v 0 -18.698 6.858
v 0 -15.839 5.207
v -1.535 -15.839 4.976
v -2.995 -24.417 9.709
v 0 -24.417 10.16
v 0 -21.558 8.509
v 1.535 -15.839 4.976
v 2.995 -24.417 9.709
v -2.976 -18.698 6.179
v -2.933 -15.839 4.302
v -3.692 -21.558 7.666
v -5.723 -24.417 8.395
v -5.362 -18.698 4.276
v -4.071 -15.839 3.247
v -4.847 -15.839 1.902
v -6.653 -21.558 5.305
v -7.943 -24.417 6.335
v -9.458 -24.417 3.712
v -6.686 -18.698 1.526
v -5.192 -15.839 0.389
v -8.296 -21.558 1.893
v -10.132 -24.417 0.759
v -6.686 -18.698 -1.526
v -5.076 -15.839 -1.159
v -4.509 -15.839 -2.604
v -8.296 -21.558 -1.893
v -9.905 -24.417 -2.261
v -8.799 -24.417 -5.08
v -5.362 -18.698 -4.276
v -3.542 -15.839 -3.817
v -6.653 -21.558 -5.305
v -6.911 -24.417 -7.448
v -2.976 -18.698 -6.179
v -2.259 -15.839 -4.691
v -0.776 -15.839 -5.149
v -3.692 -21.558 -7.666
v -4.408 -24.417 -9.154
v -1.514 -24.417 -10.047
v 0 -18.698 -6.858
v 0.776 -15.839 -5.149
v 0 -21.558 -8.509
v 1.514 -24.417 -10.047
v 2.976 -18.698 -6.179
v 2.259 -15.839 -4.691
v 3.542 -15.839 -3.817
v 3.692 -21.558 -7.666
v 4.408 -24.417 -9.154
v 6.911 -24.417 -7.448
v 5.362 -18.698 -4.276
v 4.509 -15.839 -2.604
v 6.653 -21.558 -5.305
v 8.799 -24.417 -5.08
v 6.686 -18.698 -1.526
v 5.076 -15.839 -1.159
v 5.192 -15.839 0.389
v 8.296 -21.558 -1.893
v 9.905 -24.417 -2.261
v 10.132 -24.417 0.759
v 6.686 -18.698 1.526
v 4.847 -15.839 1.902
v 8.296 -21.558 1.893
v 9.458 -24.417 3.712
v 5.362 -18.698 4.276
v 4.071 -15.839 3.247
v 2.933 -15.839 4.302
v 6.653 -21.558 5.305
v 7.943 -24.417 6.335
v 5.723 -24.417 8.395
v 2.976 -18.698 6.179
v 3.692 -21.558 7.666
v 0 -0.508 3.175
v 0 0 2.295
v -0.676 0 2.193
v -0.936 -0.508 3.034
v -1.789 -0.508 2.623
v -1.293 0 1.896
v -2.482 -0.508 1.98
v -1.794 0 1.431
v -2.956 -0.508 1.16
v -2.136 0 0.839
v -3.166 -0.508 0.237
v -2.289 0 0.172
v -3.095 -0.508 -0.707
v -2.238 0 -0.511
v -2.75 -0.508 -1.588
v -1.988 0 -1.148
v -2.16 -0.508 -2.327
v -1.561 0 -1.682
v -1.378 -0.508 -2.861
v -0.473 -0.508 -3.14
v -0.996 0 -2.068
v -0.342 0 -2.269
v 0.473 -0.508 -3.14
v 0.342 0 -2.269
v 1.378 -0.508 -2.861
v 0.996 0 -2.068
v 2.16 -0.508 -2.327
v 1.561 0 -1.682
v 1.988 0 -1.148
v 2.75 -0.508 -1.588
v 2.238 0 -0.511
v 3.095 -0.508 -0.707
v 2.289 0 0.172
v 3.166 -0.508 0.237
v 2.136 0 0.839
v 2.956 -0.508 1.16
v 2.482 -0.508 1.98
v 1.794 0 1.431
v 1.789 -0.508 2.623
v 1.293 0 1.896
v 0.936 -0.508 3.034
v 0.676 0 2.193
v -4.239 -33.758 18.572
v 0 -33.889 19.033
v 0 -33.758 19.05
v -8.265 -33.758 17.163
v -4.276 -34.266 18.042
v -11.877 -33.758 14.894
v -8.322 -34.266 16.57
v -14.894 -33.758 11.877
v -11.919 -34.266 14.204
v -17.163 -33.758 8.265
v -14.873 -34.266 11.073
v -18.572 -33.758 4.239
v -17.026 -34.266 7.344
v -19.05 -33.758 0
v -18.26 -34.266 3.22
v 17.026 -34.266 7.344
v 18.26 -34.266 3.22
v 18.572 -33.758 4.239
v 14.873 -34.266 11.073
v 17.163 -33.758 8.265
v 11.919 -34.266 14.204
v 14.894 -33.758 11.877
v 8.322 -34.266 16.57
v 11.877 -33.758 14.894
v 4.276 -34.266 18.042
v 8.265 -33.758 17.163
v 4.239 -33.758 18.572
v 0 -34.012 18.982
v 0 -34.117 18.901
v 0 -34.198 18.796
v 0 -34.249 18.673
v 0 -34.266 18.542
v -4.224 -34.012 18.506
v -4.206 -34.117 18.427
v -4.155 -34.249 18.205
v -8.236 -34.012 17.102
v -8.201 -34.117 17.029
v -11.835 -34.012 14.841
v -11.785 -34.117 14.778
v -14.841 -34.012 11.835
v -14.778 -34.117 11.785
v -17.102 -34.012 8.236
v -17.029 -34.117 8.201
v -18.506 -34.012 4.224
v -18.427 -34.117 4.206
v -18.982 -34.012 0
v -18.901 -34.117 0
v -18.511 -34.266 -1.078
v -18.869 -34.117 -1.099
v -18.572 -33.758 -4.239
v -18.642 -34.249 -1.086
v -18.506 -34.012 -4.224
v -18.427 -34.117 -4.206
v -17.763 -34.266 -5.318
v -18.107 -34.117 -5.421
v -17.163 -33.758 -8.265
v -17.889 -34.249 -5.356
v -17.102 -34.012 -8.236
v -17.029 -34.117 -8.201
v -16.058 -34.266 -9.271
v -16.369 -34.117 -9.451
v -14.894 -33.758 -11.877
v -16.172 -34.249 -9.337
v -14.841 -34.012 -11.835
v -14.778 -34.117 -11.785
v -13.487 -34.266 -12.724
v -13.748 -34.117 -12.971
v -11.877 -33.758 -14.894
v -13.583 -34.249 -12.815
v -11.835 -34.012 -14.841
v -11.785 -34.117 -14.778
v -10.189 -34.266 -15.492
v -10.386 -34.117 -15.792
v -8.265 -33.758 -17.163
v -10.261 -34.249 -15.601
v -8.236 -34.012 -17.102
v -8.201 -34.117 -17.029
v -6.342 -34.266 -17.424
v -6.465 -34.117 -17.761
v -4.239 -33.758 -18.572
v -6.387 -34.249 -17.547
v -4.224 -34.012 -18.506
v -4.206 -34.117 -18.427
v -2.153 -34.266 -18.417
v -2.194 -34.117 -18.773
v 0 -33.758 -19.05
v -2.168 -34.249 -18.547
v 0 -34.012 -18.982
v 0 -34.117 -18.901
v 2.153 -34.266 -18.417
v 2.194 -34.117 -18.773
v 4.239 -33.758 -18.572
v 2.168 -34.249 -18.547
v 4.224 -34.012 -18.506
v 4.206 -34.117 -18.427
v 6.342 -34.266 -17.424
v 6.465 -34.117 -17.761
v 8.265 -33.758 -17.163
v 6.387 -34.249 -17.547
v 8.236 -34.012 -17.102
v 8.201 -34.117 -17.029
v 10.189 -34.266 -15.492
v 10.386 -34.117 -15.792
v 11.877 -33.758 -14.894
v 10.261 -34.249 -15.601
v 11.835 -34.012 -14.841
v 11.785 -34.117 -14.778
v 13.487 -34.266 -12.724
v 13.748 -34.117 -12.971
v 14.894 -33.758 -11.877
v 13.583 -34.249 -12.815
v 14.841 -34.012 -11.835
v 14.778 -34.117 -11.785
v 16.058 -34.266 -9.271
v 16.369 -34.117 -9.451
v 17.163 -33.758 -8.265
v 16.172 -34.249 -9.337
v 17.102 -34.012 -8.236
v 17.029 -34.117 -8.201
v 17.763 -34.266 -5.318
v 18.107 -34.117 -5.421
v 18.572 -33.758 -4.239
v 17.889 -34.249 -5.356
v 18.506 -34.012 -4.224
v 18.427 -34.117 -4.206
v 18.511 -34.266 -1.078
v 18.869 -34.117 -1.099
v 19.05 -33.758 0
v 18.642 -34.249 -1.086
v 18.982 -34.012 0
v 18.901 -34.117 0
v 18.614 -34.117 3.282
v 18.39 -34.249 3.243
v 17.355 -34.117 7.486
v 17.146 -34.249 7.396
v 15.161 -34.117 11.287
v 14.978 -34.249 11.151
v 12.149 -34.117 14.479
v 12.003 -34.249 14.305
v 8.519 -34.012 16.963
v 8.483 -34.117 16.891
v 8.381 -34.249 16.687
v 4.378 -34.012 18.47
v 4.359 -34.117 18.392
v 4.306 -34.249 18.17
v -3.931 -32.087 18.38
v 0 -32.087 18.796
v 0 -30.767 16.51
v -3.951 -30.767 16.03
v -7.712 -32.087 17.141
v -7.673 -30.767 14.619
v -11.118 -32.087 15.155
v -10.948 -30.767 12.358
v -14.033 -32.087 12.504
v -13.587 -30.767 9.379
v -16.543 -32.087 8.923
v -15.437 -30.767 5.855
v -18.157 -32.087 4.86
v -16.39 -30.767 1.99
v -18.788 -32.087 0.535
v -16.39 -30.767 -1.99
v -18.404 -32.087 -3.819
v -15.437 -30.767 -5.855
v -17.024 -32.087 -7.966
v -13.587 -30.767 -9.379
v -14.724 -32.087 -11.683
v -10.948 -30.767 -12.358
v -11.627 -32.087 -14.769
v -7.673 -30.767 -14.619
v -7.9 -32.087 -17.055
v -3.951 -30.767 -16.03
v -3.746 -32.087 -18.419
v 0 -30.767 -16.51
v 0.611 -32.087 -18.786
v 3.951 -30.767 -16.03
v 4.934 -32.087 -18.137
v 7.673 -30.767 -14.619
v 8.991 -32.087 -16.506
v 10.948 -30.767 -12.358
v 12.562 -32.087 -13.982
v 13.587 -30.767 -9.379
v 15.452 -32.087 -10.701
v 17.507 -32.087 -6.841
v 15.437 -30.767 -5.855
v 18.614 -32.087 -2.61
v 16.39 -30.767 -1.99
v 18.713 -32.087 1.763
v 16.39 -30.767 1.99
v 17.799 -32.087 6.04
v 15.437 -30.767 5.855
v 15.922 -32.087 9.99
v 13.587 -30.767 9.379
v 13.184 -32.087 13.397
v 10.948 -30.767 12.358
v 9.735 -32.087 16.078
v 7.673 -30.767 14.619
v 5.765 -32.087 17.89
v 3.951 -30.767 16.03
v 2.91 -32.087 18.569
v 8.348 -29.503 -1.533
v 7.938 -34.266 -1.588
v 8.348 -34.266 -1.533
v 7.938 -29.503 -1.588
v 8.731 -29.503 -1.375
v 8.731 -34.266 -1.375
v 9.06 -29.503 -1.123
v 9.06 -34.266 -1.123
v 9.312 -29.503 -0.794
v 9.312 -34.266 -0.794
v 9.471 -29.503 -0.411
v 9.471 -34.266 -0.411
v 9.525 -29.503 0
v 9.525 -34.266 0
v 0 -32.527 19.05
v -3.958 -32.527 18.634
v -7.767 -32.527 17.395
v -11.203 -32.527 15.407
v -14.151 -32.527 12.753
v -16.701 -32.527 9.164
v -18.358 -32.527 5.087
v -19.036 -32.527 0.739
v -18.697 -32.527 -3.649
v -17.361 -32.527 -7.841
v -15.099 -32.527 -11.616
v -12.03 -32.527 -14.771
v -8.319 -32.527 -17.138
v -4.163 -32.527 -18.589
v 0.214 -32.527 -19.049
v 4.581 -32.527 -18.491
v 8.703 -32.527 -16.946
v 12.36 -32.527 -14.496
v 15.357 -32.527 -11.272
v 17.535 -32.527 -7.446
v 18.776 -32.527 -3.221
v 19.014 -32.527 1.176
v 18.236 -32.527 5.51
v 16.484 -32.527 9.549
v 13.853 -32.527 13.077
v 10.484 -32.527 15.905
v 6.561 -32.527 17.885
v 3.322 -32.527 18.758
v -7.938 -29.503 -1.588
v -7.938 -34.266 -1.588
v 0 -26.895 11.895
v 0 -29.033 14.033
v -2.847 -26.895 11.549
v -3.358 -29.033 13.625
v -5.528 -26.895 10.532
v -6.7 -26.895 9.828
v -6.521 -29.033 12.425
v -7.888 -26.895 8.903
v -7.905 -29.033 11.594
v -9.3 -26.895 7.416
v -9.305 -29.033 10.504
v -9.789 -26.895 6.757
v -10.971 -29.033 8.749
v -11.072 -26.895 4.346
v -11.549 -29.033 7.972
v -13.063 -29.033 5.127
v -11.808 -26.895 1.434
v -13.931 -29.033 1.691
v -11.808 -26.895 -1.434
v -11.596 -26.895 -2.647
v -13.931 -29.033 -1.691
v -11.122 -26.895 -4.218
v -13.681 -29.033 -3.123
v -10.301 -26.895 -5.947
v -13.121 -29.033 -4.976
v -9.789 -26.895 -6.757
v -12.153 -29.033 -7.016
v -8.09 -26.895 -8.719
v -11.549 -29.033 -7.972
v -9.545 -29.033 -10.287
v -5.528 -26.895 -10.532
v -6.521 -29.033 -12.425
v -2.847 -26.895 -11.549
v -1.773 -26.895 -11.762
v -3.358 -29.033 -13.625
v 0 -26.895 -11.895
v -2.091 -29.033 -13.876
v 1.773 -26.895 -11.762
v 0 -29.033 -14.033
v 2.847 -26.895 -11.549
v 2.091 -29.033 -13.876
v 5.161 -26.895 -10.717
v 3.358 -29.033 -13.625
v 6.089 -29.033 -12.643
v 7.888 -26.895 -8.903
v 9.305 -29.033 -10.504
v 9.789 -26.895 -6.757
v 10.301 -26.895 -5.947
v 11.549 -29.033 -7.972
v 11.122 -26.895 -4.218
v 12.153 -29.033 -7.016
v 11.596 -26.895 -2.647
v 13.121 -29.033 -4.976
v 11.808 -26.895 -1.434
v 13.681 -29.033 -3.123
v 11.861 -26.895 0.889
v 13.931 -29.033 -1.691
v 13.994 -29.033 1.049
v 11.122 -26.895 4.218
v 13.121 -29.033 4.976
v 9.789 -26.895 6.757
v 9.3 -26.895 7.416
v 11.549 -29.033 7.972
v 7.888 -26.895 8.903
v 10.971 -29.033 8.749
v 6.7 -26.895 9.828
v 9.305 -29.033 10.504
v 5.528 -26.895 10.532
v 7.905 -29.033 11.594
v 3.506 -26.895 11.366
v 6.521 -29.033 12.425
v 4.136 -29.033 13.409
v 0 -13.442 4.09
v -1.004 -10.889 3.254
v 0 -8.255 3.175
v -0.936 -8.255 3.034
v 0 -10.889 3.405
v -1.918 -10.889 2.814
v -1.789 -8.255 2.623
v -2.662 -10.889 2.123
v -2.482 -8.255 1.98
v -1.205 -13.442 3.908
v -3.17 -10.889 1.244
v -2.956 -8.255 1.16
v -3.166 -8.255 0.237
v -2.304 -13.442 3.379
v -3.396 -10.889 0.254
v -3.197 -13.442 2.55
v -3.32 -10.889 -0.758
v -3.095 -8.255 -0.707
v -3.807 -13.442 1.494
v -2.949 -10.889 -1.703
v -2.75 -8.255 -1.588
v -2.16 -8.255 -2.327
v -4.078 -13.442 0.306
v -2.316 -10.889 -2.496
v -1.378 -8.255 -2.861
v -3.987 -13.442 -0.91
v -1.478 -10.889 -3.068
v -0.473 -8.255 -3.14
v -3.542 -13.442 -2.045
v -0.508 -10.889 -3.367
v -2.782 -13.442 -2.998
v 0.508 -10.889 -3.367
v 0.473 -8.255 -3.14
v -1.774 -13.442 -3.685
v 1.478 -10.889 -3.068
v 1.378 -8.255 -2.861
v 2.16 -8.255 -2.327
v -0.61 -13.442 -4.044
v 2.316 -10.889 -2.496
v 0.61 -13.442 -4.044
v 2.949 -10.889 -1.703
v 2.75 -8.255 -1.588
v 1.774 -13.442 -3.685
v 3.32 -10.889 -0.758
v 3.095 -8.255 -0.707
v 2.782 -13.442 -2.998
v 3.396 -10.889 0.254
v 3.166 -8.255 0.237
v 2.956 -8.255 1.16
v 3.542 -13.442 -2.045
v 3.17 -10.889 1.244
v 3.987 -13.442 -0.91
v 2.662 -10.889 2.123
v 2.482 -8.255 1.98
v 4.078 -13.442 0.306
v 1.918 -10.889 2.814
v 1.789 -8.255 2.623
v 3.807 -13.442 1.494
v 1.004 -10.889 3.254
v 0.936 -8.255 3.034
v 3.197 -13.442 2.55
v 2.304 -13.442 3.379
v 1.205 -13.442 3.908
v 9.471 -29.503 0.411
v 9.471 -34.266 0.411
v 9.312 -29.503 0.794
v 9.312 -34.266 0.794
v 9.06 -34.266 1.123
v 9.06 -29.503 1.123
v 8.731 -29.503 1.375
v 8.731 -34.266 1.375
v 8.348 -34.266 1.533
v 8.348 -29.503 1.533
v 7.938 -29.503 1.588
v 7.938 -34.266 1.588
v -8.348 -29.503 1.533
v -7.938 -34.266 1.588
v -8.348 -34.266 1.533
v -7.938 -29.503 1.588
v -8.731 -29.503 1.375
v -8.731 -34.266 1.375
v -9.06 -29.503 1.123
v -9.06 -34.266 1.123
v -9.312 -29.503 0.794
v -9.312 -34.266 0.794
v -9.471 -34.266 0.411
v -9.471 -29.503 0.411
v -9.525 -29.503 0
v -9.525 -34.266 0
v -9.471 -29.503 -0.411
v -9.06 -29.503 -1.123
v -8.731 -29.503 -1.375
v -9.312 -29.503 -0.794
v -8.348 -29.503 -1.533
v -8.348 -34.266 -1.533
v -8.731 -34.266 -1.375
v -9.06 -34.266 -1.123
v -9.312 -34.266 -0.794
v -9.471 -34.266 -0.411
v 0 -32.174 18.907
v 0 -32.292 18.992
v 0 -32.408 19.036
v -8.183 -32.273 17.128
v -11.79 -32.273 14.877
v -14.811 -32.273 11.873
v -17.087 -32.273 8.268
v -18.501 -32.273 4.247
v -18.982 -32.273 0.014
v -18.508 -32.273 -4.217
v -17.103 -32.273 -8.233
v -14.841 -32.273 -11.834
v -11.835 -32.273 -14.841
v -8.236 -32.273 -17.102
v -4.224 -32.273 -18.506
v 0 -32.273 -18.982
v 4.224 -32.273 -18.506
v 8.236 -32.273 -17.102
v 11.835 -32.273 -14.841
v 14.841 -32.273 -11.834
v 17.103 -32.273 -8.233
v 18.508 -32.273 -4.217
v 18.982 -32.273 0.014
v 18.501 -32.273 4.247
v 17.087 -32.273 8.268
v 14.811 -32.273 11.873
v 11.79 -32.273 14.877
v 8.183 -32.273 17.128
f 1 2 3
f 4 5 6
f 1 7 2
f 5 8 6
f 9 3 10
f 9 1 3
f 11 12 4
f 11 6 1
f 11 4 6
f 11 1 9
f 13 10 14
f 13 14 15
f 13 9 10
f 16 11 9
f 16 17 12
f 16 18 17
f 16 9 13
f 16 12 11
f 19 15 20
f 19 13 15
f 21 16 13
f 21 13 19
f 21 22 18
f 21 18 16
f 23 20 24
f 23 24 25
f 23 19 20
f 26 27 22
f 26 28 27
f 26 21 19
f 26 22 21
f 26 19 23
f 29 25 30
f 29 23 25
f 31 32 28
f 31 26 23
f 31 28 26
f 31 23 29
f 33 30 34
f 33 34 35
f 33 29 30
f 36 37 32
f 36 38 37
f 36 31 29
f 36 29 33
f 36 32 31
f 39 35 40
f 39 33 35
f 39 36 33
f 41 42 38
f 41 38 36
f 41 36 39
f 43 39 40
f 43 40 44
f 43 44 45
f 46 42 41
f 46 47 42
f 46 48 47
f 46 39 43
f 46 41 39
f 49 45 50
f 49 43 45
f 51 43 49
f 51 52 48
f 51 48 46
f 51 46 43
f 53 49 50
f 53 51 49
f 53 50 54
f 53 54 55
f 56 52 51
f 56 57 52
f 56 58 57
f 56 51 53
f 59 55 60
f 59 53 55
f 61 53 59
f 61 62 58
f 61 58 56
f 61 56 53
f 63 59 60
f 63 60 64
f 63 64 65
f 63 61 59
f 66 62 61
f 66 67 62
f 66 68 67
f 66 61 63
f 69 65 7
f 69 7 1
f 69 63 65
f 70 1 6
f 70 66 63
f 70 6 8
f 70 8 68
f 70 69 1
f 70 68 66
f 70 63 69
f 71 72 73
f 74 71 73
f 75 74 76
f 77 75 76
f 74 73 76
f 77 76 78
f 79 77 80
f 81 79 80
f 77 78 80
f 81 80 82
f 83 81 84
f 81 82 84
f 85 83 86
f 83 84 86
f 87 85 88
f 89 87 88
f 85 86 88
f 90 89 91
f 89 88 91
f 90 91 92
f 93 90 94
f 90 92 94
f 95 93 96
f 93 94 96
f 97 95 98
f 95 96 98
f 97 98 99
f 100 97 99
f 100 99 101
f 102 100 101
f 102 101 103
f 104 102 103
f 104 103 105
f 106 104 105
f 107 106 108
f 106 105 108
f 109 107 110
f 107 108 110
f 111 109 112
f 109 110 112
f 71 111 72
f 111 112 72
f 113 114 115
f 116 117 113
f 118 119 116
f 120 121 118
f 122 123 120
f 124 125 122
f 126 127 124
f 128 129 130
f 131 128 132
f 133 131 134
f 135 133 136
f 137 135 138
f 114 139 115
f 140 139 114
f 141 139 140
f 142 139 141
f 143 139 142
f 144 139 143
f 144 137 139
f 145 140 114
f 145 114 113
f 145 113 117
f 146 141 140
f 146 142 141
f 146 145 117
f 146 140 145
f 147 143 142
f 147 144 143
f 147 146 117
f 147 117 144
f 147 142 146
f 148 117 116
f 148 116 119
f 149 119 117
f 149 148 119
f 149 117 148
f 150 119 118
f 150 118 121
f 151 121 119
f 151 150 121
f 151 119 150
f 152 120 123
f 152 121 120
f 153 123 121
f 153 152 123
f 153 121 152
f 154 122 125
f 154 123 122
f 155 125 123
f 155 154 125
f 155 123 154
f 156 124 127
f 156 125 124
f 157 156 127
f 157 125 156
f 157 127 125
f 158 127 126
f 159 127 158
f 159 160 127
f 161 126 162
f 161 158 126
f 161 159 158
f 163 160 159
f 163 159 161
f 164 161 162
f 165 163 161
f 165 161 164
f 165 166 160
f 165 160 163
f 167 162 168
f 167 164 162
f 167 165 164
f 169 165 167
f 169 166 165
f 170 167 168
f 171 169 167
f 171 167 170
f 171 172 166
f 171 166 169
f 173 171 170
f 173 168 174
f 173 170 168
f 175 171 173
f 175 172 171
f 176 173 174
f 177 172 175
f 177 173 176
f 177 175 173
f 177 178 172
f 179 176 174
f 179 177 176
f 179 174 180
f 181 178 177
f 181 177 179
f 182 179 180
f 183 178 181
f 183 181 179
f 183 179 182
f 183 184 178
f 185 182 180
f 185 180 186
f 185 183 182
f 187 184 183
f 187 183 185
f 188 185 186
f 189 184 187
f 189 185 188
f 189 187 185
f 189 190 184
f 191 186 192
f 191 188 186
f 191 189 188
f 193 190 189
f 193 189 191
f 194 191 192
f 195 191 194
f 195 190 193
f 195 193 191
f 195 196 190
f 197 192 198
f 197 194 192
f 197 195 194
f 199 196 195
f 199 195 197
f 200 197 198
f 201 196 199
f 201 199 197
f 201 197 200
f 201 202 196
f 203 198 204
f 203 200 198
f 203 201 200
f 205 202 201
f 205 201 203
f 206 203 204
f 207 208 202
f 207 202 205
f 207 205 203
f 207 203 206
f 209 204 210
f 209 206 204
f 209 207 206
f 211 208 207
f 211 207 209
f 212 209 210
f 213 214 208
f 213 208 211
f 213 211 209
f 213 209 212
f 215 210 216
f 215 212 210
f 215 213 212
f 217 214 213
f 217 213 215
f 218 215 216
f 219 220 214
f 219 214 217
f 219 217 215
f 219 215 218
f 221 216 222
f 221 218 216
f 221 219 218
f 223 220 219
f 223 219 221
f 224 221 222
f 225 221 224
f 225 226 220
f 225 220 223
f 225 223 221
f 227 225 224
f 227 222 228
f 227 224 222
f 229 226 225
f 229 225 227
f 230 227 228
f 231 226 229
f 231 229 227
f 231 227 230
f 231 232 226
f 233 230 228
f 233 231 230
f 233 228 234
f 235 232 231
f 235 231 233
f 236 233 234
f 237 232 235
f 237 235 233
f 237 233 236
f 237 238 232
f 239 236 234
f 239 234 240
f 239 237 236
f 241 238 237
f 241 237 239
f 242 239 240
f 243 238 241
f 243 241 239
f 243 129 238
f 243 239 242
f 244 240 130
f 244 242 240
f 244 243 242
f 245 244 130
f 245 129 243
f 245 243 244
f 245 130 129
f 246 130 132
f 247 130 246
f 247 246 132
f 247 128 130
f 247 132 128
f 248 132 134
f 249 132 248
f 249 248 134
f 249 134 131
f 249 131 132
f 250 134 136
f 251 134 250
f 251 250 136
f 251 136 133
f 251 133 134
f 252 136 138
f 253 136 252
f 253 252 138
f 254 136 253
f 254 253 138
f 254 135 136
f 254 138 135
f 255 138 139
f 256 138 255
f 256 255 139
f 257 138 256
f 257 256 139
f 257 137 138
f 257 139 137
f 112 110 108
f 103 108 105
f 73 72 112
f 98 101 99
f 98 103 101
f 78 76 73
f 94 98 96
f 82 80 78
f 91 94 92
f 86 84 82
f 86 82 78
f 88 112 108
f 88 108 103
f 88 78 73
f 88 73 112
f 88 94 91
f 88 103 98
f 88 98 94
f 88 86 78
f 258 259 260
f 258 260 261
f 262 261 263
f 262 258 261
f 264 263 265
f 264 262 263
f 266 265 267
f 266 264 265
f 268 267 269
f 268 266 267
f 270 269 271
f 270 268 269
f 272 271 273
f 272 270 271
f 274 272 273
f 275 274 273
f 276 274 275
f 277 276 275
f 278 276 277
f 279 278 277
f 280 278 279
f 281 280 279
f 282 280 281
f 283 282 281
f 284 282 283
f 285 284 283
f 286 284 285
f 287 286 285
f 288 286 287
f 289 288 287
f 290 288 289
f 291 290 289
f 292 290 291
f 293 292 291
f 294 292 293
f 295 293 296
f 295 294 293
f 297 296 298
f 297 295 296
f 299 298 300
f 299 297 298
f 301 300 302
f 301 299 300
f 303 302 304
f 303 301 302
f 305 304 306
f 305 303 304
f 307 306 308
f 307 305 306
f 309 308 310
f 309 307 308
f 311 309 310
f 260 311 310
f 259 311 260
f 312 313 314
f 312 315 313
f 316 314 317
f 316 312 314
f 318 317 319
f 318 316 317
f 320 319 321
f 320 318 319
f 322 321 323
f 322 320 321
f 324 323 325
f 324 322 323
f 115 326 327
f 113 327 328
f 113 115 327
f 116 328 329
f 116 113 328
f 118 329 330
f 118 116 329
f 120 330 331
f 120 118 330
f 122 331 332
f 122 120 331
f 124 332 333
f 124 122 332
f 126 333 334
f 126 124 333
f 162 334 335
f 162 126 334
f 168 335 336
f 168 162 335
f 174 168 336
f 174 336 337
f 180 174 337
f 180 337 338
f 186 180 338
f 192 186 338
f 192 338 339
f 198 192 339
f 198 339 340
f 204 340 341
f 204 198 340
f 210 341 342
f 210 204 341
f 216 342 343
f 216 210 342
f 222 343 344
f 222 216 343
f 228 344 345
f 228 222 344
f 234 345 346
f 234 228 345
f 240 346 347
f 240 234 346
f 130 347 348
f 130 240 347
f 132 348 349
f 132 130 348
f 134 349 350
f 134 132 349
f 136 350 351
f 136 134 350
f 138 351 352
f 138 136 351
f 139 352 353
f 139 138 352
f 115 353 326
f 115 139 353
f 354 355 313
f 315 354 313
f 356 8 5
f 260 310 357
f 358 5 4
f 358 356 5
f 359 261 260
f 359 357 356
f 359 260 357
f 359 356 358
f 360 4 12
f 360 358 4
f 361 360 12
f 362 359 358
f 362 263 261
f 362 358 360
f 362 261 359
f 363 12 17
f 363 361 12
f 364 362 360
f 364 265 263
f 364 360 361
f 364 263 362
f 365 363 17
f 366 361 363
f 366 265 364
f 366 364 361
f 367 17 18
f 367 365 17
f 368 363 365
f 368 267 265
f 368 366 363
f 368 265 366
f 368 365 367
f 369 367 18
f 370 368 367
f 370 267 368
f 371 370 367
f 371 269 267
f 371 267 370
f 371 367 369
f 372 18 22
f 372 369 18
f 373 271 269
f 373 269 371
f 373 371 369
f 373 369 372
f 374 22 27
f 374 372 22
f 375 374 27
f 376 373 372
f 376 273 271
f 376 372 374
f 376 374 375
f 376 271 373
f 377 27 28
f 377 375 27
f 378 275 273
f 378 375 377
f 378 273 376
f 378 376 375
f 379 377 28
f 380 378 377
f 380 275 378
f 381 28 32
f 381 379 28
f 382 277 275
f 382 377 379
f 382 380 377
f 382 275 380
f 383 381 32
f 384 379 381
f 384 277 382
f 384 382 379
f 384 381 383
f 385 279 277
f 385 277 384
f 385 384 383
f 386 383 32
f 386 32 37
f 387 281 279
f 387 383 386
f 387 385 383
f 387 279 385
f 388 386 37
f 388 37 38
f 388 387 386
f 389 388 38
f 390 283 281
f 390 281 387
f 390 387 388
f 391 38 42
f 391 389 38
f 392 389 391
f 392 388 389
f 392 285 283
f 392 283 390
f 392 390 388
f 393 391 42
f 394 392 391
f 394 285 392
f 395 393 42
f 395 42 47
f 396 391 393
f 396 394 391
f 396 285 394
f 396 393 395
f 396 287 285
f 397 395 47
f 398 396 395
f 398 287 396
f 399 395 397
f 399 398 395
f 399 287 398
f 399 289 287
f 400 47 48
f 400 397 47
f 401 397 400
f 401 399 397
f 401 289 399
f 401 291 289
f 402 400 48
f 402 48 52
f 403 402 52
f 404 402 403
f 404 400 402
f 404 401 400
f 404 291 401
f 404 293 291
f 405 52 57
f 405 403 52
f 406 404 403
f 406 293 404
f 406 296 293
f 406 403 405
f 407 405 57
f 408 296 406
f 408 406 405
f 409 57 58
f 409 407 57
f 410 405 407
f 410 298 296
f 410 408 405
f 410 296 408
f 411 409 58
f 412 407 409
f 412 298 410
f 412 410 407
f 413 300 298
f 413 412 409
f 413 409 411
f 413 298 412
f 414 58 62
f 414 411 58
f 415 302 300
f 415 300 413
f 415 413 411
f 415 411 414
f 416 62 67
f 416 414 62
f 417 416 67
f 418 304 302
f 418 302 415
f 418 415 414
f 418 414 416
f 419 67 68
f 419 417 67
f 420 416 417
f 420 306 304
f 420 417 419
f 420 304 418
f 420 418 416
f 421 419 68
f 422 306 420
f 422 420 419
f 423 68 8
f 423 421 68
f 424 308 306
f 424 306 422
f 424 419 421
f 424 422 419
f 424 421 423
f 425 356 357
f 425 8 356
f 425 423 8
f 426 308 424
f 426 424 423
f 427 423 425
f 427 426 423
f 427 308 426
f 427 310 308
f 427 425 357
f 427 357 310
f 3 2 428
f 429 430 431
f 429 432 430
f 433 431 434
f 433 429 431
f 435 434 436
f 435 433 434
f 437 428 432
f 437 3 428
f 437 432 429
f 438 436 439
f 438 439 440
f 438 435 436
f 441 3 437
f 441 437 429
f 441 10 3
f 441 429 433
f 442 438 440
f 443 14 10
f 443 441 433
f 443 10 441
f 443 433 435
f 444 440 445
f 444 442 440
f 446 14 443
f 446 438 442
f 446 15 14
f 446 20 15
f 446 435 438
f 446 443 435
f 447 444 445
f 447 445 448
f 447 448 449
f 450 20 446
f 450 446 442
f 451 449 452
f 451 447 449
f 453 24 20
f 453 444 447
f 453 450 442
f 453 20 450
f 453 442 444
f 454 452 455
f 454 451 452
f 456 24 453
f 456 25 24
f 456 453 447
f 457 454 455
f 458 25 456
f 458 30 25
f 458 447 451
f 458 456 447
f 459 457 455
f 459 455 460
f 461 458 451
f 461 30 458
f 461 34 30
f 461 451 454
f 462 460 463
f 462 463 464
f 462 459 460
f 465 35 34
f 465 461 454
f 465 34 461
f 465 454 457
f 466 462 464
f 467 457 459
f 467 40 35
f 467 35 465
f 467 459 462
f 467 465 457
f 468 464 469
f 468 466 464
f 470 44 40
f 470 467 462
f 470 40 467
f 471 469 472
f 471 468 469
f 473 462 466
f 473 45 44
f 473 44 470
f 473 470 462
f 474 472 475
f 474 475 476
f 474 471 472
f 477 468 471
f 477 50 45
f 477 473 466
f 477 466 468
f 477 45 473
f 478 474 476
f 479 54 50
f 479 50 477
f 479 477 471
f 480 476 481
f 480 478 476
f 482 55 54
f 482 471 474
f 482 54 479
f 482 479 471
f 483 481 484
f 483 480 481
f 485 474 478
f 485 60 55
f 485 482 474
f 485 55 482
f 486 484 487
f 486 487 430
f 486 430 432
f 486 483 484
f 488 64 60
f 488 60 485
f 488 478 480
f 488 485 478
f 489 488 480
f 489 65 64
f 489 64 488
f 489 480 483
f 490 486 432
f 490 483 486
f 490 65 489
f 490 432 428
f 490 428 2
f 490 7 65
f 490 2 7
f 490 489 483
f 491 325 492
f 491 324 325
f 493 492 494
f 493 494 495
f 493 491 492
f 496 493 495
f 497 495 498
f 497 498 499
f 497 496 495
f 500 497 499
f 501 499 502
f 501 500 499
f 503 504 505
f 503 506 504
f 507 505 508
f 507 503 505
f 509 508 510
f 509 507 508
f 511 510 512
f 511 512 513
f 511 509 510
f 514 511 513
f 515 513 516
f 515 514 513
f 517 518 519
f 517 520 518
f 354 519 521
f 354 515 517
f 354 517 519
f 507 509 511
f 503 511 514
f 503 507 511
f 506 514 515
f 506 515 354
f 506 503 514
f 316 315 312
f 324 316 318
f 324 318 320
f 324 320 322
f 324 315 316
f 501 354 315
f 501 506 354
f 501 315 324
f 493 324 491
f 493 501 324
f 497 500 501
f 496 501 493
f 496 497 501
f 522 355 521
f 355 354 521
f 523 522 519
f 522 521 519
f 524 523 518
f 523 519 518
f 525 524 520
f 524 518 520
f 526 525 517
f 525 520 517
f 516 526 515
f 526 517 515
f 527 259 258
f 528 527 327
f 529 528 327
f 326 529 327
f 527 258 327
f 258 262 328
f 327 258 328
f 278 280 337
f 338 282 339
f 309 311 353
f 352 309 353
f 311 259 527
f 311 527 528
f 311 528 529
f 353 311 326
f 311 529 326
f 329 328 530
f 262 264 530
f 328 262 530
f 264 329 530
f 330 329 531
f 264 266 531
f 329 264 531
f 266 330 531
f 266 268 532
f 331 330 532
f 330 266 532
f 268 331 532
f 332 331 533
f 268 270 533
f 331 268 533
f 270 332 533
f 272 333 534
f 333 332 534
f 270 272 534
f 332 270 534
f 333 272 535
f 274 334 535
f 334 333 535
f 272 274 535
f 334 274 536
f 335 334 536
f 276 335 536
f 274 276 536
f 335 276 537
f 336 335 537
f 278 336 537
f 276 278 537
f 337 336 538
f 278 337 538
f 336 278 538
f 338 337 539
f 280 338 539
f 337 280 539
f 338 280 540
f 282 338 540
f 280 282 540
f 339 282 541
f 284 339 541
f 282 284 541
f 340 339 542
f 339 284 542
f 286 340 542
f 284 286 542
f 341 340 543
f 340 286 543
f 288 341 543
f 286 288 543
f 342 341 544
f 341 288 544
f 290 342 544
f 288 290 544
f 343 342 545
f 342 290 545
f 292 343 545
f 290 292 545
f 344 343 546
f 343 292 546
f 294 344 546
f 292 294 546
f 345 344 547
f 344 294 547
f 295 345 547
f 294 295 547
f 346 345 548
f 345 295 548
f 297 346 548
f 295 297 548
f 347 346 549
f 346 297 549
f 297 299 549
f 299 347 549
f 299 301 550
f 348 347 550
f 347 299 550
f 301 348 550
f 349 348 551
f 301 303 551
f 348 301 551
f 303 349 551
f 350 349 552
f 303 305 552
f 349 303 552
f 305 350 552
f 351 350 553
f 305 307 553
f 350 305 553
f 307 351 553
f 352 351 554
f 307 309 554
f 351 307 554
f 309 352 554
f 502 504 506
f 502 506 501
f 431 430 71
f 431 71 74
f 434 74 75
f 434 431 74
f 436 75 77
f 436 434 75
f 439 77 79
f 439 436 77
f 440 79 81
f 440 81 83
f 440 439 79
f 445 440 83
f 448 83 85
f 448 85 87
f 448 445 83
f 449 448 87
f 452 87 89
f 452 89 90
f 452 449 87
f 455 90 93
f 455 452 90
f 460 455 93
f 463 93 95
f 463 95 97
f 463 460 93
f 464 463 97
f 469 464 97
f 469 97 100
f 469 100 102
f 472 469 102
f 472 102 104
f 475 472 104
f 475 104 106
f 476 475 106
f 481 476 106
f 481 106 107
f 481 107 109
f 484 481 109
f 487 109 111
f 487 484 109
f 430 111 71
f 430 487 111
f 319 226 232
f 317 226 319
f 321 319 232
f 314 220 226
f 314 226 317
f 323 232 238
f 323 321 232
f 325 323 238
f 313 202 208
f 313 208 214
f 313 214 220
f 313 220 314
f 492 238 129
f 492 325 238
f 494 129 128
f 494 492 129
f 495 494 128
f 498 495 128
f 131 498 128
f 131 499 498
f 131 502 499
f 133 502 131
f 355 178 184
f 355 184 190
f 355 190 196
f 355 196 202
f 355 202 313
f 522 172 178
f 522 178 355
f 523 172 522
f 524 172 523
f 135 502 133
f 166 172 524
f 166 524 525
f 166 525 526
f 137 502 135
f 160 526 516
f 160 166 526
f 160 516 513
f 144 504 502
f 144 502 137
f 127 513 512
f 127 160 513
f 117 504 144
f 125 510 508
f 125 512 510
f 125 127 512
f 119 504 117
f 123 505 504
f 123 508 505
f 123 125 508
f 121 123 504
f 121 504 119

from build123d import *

# Parameters (mm, degrees)
FILLET1_R          = 0.508
CHAMFER1_SIZE      = 0.508
CHAMFER1_SIZE2     = 0.87988181
SKETCH4_W          = 19.05
SKETCH4_H          = 3.175
CUT_EXTRUDE1_DEPTH = 4.7625
FILLET2_R          = 1.5875


with BuildPart() as part:
    # Sketch3 → Revolve1 (revolve)
    with BuildSketch(Plane(origin=(0, 0, 0), x_dir=(0, 0, -1), z_dir=(1, 0, 0)), mode=Mode.PRIVATE) as revolve1_sk:
        with BuildLine():
            Line((0, 0), (3.175, 0))
            Line((3.175, 0), (3.175, -8.255))
            ThreePointArc((3.175, -8.255), (3.691804849, -12.180522558), (5.207, -15.838527241))
            Line((5.207, -15.838527241), (10.16, -24.417374891))
            ThreePointArc((10.16, -24.417374891), (12.91700332, -28.010371571), (16.51, -30.767374891))
            Line((16.51, -30.767374891), (19.05, -32.233844575))
            Line((19.05, -32.233844575), (19.05, -34.265844575))
            Line((19.05, -34.265844575), (0, -34.265844575))
            Line((0, -34.265844575), (0, 0))
        make_face()
    revolve(revolve1_sk.sketch.rotate(Axis((0, 0, 0), (0, -1, 0)), 180), axis=Axis((0, 0, 0), (0, -1, 0)))

    # Fillet1
    fillet1_edges = [part.edges().sort_by_distance(p)[0] for p in [
        (0, -32.233844575, -19.05),
        (0, -34.265844575, -19.05),
    ]]
    fillet(fillet1_edges, radius=FILLET1_R)

    # Chamfer1
    chamfer1_edges = [part.edges().sort_by_distance(p)[0] for p in [
        (0, 0, -3.175),
    ]]
    chamfer1_side = [part.faces().sort_by_distance(p)[0] for p in [
        (0, -4.1275, -3.175),
    ]]
    chamfer(chamfer1_edges, length=CHAMFER1_SIZE, length2=CHAMFER1_SIZE2, reference=chamfer1_side[0])

    # Sketch4 → Cut-Extrude1 (cut)
    with BuildSketch(Plane.XZ.offset(34.265844575)):
        Rectangle(SKETCH4_W, SKETCH4_H)
    extrude(amount=-CUT_EXTRUDE1_DEPTH, mode=Mode.SUBTRACT)

    # Fillet2
    fillet2_edges = [part.edges().sort_by_distance(p)[0] for p in [
        (-9.525, -31.884594575, -1.5875),
        (9.525, -31.884594575, -1.5875),
        (9.525, -31.884594575, 1.5875),
        (-9.525, -31.884594575, 1.5875),
    ]]
    fillet(fillet2_edges, radius=FILLET2_R - 0.0001)  # a hair under: the kernel refuses the full size


solid = part.part
